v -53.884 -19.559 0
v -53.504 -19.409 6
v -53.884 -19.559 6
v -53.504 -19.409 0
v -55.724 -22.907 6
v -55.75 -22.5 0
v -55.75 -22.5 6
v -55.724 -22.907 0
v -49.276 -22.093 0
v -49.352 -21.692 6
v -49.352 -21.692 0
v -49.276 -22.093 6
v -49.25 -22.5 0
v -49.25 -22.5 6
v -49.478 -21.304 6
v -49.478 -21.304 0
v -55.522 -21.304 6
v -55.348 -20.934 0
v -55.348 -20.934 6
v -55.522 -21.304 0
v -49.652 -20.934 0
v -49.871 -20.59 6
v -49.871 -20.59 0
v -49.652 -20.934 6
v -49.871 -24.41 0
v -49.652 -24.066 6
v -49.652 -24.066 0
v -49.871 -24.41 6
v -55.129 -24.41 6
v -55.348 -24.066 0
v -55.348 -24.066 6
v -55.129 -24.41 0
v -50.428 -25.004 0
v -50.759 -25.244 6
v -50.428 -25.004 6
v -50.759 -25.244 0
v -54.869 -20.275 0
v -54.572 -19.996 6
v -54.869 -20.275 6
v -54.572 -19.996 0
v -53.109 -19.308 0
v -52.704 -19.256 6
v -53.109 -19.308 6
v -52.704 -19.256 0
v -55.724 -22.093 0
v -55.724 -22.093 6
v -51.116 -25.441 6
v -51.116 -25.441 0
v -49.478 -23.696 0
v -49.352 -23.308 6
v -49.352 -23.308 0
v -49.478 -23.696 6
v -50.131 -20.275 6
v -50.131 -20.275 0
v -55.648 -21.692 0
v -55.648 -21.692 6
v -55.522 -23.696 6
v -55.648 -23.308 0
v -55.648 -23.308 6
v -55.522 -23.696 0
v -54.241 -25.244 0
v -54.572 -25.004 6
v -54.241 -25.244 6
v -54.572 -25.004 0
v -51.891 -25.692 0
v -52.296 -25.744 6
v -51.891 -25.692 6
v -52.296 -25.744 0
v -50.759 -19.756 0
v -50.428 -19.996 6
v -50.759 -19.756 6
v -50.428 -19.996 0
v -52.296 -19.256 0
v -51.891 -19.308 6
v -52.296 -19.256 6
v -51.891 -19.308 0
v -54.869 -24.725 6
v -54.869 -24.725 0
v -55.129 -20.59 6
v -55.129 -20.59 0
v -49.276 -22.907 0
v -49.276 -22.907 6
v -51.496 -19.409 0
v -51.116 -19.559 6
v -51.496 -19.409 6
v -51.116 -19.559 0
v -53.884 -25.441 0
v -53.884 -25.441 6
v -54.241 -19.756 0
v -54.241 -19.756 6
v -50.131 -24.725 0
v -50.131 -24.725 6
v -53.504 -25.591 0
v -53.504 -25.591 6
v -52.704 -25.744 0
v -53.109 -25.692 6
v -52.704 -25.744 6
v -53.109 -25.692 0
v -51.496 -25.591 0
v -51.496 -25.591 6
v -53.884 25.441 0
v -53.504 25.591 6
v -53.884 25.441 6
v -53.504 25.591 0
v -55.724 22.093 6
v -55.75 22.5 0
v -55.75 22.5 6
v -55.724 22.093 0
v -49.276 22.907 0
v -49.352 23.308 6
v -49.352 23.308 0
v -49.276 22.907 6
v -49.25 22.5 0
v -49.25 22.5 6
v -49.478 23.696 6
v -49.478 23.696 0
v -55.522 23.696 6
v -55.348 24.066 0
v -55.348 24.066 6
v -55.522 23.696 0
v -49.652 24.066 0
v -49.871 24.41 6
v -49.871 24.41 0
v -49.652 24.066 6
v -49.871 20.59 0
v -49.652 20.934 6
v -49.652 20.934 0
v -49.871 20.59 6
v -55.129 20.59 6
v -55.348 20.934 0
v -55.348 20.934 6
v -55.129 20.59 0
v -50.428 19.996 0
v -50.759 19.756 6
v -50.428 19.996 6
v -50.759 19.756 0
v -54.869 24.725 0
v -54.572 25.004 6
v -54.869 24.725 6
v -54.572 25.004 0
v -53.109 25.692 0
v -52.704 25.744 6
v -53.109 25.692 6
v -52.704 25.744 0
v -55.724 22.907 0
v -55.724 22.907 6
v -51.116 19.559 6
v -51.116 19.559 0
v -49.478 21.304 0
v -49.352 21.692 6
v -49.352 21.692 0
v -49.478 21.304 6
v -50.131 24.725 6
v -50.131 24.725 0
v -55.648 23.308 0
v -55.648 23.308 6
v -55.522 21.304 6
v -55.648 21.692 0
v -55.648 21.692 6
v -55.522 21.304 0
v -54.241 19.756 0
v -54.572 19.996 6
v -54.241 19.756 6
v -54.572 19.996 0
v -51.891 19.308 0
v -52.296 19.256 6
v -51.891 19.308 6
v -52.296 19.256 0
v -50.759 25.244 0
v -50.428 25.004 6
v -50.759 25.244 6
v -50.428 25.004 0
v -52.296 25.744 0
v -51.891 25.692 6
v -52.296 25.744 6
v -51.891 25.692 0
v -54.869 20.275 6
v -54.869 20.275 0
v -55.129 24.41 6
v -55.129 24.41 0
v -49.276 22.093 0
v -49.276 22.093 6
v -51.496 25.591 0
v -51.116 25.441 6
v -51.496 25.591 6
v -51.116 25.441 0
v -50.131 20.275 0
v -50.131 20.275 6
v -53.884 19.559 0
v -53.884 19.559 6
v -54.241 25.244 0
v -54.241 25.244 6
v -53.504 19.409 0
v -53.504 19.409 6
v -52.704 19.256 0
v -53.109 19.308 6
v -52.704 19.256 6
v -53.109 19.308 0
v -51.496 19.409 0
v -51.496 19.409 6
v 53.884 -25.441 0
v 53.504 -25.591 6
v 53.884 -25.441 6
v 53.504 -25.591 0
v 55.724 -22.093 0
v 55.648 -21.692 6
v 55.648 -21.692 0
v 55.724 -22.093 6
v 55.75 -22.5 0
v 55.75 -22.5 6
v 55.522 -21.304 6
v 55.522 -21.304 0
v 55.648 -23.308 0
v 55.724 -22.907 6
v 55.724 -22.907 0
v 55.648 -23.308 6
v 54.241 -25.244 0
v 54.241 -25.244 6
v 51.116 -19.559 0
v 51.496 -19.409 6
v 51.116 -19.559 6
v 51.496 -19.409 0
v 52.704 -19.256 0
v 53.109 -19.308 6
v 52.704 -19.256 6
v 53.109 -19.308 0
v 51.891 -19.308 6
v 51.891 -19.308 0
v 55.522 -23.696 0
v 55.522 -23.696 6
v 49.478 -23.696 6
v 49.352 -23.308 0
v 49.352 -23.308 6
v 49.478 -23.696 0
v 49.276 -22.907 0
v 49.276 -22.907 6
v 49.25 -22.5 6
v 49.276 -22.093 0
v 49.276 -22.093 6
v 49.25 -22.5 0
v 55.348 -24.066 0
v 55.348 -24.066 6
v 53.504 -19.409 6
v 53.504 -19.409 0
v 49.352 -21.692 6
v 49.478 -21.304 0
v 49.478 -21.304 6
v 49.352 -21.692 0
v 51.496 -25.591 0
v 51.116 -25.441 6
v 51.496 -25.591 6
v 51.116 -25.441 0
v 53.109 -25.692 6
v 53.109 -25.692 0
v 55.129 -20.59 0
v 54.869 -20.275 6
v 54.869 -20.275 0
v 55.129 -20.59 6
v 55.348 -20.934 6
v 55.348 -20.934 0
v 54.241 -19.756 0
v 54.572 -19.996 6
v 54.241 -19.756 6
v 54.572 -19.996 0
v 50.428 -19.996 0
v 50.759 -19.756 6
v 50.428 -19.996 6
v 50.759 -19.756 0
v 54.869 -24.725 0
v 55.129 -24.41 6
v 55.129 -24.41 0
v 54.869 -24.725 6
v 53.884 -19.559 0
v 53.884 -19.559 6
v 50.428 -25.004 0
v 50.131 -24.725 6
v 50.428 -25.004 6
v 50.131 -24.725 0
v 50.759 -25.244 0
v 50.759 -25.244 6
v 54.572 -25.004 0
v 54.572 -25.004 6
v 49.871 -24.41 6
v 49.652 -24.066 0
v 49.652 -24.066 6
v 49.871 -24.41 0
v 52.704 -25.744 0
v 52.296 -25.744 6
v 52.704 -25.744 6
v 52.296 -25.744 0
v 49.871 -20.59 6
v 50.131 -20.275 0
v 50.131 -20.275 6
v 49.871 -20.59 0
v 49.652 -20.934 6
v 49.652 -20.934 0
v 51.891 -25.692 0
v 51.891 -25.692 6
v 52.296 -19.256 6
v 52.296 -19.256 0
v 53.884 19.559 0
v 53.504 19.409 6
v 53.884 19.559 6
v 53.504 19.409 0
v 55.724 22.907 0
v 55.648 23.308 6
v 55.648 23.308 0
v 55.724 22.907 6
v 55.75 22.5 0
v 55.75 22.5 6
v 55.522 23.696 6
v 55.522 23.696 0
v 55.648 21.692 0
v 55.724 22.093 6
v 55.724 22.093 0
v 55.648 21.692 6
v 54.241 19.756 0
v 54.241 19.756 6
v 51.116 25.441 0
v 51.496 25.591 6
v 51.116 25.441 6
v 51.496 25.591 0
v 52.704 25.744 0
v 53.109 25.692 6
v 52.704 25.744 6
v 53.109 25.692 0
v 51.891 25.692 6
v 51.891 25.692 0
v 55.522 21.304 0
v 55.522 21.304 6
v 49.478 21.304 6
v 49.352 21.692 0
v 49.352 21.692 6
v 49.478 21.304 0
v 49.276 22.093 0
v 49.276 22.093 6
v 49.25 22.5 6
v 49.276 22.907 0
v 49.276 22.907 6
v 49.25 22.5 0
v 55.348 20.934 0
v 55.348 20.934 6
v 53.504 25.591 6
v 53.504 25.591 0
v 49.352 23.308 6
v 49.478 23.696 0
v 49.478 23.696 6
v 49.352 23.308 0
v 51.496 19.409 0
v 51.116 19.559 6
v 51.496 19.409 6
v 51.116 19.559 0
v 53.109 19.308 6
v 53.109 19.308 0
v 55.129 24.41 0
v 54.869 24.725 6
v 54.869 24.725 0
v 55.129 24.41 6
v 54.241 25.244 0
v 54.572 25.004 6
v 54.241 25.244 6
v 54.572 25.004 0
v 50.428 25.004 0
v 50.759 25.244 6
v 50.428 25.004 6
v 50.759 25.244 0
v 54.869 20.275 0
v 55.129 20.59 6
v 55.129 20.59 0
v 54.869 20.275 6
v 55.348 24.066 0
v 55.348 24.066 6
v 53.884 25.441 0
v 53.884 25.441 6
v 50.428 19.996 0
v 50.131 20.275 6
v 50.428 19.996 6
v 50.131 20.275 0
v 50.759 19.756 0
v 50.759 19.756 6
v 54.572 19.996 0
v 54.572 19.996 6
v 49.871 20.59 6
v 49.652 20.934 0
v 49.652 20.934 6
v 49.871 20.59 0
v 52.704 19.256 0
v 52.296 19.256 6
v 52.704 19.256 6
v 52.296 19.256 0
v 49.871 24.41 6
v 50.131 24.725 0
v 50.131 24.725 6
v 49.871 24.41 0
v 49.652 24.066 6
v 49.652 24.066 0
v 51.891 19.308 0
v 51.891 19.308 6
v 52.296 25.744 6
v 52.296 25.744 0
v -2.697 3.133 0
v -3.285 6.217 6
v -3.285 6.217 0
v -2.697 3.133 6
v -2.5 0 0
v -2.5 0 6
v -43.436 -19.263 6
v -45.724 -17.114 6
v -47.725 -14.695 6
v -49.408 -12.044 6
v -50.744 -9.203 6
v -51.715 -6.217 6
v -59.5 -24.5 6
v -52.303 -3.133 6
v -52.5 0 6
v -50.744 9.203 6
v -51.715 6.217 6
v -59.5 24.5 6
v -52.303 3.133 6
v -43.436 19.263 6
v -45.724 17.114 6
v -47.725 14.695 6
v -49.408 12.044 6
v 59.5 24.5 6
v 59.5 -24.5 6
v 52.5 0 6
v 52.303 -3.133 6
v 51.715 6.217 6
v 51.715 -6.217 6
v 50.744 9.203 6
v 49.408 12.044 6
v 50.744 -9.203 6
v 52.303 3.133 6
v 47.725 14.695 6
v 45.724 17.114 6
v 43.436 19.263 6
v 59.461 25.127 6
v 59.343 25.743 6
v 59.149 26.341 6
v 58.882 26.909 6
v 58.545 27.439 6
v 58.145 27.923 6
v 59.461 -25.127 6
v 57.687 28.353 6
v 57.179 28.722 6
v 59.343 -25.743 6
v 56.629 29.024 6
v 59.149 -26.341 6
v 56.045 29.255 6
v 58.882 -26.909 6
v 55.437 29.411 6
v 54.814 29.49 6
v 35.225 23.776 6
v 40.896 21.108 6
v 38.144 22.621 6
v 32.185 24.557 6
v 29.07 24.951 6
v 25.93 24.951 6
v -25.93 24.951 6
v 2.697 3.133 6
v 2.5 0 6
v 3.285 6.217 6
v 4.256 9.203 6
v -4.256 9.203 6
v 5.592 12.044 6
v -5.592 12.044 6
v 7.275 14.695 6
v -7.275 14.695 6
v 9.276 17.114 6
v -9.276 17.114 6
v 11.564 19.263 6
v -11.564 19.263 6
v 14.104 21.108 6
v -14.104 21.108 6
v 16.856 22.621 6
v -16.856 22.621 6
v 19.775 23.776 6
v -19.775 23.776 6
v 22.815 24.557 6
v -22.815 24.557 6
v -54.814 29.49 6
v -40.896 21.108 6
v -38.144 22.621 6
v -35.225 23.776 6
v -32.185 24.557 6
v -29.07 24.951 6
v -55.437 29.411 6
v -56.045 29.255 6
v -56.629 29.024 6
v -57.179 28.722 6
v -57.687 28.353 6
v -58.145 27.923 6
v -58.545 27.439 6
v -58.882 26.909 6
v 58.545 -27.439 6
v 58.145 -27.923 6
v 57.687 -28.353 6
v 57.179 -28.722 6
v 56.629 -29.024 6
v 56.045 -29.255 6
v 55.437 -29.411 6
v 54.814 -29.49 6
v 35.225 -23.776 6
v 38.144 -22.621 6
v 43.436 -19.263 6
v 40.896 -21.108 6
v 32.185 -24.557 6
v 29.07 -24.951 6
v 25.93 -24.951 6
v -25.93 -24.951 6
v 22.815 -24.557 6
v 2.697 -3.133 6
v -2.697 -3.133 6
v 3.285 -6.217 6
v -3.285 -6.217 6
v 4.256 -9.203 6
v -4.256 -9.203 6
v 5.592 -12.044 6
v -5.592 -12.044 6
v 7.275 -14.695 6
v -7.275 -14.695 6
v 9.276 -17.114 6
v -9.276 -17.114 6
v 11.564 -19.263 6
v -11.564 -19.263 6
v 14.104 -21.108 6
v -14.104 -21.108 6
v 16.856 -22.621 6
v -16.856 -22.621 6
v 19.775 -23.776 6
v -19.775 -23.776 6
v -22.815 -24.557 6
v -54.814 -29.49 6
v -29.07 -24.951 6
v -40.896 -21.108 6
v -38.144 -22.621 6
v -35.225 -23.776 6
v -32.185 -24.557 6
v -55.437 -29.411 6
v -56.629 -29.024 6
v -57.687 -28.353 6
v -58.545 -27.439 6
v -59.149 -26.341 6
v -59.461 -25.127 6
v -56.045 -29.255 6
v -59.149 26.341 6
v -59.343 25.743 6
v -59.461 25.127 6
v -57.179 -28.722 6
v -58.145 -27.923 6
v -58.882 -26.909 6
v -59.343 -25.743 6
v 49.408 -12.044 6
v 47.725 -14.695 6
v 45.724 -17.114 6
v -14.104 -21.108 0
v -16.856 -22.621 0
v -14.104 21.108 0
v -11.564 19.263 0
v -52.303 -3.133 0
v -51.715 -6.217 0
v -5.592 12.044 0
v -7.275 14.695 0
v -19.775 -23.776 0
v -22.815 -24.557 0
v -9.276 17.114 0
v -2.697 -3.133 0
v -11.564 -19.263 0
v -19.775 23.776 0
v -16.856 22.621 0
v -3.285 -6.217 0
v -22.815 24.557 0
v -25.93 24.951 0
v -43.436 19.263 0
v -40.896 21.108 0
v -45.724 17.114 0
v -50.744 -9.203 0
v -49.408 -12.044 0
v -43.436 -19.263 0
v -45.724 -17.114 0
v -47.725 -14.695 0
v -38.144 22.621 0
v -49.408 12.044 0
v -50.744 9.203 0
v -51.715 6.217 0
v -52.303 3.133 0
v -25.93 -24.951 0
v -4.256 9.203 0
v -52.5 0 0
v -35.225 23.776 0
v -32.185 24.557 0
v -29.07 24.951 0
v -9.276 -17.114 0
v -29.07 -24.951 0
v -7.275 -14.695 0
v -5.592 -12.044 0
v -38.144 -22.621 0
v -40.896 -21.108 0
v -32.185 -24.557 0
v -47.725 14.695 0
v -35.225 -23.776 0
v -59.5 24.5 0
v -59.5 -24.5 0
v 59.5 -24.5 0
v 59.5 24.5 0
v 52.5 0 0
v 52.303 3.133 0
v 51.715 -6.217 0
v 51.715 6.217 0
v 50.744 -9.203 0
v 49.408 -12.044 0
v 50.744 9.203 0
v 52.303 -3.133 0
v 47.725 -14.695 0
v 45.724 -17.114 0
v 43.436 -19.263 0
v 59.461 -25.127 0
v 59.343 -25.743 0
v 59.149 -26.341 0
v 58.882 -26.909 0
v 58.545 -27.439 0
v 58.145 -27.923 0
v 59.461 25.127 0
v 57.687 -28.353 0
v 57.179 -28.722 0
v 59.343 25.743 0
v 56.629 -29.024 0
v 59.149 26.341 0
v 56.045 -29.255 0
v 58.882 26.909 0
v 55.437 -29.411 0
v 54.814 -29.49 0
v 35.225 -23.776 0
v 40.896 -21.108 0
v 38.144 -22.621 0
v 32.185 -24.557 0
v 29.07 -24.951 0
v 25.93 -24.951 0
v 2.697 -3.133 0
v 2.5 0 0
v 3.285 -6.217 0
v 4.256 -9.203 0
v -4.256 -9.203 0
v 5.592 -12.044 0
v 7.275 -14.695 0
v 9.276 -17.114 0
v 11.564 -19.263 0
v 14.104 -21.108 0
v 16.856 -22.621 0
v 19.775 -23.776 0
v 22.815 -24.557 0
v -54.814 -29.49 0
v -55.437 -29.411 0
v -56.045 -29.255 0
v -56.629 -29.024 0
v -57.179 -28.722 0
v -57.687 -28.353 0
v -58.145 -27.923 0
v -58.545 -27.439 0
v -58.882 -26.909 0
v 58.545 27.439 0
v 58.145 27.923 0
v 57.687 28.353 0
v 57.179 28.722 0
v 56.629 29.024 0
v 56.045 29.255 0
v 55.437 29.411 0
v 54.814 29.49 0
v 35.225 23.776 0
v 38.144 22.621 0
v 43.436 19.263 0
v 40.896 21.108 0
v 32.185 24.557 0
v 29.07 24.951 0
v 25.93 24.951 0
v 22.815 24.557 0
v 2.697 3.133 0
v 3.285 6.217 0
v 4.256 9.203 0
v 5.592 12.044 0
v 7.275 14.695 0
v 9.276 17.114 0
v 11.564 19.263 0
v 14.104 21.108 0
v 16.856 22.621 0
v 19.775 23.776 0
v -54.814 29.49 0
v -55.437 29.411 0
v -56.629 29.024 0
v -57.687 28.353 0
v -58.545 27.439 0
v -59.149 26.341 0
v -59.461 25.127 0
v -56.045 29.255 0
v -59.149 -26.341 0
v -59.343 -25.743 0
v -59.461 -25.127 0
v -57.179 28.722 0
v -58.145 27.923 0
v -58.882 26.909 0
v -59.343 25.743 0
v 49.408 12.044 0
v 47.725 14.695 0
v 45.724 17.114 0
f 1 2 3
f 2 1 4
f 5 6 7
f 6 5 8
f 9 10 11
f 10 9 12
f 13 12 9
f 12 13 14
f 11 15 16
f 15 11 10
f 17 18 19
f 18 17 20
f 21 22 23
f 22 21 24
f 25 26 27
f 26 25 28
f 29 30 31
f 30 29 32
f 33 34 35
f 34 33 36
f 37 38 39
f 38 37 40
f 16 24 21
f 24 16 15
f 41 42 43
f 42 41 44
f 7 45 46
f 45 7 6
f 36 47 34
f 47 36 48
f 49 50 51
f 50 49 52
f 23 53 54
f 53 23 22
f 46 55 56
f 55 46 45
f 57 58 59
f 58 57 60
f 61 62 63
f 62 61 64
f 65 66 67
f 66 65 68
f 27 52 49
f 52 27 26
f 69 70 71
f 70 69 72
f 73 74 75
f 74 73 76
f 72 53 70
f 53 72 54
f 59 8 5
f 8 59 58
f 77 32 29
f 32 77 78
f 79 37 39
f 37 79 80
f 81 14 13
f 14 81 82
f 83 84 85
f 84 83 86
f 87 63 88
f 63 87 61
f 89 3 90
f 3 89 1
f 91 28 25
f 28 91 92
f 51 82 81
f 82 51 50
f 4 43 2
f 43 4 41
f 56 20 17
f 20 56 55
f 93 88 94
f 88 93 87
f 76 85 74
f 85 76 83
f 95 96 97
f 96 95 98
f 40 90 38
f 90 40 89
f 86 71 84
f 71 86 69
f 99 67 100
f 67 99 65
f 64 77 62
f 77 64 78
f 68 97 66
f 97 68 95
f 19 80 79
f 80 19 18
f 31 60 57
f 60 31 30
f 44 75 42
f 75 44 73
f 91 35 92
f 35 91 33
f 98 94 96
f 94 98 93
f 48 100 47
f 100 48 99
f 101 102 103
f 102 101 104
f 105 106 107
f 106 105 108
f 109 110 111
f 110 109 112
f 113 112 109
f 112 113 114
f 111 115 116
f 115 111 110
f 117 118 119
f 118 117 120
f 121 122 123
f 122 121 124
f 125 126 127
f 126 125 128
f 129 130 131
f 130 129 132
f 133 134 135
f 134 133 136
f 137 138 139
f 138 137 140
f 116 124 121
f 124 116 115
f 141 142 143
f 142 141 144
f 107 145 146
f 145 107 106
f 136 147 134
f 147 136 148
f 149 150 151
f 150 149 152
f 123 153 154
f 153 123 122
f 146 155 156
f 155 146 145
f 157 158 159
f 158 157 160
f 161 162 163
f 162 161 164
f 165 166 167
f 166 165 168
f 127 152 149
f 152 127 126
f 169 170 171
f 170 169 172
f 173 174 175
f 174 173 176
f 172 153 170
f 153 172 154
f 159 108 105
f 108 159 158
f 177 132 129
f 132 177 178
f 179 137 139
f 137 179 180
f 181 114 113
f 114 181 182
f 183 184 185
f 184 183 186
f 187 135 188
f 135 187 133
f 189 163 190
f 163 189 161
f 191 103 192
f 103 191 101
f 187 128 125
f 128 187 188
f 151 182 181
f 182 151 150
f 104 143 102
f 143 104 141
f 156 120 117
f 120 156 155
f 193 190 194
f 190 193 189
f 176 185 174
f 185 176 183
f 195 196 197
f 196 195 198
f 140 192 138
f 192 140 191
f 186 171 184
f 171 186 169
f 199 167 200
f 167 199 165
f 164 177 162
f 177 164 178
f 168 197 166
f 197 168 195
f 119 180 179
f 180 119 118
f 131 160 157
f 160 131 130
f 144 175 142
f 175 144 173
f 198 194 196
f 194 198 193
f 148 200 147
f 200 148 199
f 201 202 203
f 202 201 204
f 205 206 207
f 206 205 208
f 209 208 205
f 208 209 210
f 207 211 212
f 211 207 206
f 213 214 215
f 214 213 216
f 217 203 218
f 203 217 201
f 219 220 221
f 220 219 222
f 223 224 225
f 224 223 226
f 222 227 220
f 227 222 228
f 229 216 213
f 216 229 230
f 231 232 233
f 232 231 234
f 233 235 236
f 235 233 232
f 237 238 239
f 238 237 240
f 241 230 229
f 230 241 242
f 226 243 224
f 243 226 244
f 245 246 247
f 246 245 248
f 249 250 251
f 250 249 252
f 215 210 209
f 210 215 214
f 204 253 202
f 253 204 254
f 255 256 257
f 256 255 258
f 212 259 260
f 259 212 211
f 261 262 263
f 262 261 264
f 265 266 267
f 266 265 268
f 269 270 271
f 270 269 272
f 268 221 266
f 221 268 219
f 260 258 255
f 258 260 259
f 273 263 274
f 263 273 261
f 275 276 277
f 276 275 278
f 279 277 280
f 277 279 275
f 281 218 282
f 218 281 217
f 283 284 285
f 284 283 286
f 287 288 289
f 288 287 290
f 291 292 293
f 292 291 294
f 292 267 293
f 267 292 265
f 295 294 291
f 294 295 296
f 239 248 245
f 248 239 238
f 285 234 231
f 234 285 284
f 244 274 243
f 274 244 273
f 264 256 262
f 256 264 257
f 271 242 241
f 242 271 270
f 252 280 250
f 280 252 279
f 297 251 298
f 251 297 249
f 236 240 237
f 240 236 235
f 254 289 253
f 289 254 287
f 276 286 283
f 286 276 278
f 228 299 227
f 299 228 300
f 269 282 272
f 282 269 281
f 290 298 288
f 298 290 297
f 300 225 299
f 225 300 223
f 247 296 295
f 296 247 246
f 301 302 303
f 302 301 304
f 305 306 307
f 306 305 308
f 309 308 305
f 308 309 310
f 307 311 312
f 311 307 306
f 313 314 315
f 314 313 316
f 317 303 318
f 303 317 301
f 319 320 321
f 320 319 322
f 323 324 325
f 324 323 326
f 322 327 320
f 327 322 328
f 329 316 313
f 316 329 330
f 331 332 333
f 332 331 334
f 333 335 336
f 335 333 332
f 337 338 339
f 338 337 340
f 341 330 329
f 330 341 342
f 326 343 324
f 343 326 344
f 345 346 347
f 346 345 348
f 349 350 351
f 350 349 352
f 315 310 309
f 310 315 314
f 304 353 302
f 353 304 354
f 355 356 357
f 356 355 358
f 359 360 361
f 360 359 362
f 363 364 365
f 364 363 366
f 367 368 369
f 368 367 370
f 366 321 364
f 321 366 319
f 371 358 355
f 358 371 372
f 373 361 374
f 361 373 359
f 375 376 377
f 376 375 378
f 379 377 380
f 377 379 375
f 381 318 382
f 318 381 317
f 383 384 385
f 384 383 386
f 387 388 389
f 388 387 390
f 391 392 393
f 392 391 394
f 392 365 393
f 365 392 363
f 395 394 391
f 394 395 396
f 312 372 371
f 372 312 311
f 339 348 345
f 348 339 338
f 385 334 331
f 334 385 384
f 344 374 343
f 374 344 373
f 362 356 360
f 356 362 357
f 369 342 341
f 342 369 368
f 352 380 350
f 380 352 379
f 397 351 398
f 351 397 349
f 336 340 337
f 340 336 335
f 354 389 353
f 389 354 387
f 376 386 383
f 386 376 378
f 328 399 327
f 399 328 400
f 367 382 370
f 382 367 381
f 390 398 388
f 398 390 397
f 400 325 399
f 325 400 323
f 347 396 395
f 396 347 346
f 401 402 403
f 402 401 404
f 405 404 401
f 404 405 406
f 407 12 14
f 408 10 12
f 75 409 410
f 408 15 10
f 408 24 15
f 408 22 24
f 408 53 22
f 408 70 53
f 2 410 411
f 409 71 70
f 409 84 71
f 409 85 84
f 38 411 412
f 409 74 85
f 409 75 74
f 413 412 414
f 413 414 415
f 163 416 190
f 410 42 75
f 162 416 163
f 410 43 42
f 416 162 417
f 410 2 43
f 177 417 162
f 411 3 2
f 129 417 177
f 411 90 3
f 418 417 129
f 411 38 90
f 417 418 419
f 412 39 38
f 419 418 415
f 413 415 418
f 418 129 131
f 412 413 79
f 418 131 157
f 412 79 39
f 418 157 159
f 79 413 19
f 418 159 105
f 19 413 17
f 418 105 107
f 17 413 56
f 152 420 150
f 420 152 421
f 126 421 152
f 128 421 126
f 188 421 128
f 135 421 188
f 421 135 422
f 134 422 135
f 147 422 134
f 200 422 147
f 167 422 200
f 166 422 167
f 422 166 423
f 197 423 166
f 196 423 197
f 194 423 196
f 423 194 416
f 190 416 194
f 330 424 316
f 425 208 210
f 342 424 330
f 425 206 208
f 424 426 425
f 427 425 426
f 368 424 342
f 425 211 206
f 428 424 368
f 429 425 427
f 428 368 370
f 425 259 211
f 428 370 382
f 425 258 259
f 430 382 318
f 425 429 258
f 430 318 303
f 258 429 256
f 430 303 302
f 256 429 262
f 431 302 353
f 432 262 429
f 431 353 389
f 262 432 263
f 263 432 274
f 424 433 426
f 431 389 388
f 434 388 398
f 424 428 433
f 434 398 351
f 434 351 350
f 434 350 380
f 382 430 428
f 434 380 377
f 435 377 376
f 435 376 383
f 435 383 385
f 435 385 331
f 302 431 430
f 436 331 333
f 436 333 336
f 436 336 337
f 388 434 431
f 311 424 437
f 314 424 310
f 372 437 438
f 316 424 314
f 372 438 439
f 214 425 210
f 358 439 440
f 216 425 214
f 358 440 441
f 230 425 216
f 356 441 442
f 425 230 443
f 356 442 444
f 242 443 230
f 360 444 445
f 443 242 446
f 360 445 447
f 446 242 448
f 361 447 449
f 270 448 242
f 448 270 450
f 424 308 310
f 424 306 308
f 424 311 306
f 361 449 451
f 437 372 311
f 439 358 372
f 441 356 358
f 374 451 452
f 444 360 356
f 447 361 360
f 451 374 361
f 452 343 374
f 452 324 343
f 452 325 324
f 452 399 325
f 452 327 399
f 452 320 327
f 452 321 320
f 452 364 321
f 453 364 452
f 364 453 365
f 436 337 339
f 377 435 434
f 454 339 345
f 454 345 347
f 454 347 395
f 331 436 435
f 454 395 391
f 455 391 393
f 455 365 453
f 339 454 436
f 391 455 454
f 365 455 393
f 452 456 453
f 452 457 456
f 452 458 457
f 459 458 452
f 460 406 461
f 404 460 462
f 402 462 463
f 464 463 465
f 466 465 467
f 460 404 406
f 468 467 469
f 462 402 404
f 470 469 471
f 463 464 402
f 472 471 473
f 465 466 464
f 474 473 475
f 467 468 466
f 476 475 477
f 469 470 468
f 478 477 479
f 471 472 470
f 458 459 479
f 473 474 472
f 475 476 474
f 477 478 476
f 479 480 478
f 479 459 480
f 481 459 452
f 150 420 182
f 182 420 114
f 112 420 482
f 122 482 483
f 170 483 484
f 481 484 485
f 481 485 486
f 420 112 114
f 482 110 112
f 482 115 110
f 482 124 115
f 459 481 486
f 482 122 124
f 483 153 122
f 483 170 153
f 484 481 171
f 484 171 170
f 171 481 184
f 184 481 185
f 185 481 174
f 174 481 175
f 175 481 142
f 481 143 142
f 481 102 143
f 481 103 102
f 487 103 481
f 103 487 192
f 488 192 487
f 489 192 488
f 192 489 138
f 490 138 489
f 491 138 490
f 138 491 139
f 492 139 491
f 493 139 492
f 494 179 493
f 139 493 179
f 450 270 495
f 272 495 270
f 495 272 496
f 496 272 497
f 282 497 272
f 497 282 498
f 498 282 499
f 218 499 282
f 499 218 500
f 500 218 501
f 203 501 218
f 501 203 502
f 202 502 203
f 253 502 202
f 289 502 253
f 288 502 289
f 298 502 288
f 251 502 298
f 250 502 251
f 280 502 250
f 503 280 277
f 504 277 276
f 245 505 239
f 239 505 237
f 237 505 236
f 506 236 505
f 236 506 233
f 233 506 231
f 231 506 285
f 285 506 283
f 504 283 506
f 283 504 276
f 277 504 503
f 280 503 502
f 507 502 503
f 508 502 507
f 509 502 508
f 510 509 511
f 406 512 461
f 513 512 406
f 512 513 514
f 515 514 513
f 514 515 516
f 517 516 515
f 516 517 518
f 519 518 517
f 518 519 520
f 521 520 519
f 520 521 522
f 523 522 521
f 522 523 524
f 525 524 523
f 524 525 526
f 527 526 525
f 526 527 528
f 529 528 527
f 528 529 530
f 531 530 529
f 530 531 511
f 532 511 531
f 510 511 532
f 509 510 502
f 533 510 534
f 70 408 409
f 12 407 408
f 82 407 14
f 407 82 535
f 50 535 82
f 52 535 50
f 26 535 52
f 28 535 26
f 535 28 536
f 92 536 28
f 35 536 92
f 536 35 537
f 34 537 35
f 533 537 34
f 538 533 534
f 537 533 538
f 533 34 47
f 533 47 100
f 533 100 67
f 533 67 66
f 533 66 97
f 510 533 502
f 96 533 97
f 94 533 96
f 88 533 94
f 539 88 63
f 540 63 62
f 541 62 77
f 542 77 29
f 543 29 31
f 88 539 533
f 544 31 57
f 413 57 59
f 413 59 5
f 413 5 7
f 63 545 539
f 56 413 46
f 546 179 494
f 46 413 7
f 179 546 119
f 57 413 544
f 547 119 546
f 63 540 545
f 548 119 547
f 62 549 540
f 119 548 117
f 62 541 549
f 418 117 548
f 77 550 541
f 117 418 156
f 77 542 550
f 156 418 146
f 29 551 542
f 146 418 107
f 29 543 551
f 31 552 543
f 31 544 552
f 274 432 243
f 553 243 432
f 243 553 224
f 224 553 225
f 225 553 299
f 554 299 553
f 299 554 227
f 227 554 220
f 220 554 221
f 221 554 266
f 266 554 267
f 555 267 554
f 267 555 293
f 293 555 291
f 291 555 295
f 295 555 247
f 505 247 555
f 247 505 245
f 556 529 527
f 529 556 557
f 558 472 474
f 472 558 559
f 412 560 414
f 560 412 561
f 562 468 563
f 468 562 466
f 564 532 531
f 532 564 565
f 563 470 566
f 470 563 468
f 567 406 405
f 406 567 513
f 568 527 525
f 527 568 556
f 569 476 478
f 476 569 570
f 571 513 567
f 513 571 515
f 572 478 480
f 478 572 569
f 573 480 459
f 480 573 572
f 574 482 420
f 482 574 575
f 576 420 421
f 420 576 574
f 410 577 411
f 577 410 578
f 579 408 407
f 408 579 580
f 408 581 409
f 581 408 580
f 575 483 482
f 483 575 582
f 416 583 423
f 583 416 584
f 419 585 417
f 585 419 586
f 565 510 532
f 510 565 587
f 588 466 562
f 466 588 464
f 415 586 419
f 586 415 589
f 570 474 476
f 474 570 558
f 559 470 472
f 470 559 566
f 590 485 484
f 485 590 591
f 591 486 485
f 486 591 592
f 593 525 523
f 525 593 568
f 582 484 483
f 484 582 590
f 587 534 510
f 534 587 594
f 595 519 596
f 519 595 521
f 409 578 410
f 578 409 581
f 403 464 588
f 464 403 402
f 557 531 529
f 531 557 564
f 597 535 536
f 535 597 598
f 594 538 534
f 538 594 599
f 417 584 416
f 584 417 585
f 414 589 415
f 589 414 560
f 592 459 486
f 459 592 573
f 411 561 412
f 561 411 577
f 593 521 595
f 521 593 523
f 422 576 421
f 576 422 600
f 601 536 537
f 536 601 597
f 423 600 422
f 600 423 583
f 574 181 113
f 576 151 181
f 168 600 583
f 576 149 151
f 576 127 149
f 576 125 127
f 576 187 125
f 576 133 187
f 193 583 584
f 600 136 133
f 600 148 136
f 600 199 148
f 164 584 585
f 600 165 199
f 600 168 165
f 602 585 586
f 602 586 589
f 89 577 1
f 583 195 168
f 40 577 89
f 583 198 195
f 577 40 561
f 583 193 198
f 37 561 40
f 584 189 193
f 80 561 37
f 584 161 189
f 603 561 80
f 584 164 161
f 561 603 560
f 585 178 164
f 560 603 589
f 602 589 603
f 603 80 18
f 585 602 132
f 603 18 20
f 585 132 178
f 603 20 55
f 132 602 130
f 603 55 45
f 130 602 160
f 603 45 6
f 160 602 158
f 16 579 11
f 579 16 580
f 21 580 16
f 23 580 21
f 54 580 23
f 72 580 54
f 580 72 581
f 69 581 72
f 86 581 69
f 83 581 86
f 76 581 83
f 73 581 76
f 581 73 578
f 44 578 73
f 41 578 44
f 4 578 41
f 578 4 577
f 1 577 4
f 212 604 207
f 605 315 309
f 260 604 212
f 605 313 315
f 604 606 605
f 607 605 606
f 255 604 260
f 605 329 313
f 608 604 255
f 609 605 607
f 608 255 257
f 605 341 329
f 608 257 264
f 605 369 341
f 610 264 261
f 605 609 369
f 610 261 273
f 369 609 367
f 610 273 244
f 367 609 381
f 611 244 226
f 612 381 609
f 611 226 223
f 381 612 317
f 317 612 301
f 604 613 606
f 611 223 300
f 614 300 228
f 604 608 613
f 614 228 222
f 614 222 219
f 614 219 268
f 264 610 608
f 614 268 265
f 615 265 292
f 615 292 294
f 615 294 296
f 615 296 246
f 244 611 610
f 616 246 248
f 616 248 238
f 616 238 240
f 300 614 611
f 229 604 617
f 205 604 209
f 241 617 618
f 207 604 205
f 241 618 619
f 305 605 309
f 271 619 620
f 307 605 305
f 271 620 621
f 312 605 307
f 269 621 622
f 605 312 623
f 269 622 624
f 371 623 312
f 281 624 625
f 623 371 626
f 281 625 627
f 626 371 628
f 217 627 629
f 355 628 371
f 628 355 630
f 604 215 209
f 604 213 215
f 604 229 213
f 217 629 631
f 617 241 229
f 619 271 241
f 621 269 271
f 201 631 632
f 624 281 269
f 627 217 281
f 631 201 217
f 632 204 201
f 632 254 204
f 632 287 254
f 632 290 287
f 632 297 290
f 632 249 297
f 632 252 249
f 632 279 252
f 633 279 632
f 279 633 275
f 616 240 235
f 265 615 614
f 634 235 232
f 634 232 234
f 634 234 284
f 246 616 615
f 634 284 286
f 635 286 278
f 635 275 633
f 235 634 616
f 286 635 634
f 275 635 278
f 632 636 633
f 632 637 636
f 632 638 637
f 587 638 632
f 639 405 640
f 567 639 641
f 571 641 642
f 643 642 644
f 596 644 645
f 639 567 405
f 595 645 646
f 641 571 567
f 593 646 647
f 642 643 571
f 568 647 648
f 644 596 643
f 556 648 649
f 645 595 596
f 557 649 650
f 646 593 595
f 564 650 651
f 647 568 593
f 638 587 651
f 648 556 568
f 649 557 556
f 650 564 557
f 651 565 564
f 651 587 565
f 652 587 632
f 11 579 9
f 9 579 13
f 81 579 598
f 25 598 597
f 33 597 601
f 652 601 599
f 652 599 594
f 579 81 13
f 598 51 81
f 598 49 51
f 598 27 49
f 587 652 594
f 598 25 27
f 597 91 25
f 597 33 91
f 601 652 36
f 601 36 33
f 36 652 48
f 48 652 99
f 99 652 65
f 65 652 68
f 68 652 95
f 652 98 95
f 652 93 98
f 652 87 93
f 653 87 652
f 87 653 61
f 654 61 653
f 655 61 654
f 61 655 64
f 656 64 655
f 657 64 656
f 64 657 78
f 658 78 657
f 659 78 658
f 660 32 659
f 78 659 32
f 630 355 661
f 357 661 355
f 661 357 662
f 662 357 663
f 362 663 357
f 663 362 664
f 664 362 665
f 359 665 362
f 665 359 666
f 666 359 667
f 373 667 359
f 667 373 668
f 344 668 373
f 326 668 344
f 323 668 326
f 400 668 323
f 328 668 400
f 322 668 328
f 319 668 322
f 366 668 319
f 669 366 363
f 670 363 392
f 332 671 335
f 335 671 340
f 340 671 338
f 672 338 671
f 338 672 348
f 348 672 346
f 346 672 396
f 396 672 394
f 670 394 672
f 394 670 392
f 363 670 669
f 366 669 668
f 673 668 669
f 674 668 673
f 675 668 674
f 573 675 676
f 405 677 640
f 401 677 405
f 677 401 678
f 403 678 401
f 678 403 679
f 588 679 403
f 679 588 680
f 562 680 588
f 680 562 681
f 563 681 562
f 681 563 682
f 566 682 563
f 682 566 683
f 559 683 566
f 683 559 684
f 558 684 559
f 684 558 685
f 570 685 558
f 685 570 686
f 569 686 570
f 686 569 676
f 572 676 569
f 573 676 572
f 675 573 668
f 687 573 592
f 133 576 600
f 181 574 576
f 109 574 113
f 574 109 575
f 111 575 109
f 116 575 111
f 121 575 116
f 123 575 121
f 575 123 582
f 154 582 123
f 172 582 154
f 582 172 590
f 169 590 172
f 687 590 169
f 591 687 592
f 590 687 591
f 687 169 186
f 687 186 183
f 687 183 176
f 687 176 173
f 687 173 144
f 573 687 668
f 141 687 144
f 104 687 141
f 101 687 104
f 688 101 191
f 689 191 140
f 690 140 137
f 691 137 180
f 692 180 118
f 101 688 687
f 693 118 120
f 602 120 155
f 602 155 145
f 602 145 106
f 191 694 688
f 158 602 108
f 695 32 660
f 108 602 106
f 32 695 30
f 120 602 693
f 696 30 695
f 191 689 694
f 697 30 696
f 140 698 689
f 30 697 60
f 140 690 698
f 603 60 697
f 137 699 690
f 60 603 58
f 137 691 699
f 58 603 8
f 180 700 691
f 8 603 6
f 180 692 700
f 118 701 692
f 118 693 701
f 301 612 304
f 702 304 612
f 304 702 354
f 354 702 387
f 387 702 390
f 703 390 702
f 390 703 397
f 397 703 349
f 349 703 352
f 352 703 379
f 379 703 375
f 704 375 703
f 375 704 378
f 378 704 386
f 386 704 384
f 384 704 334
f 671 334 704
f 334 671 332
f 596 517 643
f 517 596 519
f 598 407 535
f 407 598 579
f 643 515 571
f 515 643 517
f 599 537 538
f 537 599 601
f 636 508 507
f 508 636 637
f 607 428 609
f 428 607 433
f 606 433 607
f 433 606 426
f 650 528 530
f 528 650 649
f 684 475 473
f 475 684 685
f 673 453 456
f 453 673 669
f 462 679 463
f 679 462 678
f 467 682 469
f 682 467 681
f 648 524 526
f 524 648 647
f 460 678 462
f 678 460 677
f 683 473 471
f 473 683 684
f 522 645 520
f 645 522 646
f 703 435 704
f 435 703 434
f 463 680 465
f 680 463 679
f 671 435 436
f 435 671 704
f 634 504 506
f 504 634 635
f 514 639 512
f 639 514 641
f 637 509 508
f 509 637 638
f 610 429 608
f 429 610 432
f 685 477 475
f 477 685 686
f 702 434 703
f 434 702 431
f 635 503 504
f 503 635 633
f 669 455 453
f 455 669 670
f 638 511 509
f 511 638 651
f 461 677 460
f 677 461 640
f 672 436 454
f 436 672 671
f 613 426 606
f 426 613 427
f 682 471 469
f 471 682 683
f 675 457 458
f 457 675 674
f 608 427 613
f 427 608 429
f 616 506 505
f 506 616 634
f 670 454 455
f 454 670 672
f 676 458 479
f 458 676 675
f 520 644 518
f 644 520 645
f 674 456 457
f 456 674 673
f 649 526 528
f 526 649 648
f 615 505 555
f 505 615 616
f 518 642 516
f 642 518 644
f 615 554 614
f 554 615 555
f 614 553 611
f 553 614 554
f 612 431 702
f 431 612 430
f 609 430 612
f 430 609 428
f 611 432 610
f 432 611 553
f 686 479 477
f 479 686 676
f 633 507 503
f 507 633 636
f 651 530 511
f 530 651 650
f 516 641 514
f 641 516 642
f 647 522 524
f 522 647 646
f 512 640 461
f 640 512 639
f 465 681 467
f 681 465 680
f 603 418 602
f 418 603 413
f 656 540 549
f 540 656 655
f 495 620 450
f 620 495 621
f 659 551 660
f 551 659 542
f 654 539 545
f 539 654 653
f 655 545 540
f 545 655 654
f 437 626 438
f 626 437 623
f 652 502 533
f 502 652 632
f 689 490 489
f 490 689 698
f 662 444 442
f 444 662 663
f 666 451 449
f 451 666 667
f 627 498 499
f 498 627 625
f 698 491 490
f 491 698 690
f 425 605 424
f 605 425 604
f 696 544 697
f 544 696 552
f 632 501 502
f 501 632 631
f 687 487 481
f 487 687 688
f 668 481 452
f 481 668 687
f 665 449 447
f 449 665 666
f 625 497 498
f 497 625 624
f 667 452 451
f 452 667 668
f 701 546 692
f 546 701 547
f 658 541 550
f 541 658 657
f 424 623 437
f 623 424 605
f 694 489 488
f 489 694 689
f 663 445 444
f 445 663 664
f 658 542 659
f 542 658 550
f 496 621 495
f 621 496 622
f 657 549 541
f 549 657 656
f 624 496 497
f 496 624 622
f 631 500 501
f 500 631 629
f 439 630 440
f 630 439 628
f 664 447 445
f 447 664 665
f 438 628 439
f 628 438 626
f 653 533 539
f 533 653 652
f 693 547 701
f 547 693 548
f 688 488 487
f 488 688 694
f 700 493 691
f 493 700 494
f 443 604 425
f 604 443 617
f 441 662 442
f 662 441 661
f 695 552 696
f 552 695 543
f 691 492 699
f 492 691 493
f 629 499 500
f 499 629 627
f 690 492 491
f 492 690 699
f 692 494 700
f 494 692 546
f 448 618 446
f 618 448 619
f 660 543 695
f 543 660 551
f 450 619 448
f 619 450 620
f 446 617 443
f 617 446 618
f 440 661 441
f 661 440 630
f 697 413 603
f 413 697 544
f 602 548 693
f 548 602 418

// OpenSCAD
$fn = 50;

difference() {
	union() {
		hull() {
			translate(v = [-54.5, 24.5, 0]) {
				cylinder(h = 6, r = 5);
			}
			translate(v = [54.5, 24.5, 0]) {
				cylinder(h = 6, r = 5);
			}
			translate(v = [-54.5, -24.5, 0]) {
				cylinder(h = 6, r = 5);
			}
			translate(v = [54.5, -24.5, 0]) {
				cylinder(h = 6, r = 5);
			}
		}
	}
	union() {
		translate(v = [-52.5, -22.5, -100.0]) {
			cylinder(h = 200, r = 3.25);
		}
		translate(v = [-52.5, 22.5, -100.0]) {
			cylinder(h = 200, r = 3.25);
		}
		translate(v = [52.5, -22.5, -100.0]) {
			cylinder(h = 200, r = 3.25);
		}
		translate(v = [52.5, 22.5, -100.0]) {
			cylinder(h = 200, r = 3.25);
		}
		translate(v = [-52.5, -22.5, -100.0]) {
			cylinder(h = 200, r = 1.8);
		}
		translate(v = [-52.5, 22.5, -100.0]) {
			cylinder(h = 200, r = 1.8);
		}
		translate(v = [52.5, -22.5, -100.0]) {
			cylinder(h = 200, r = 1.8);
		}
		translate(v = [52.5, 22.5, -100.0]) {
			cylinder(h = 200, r = 1.8);
		}
		translate(v = [-27.5, 0, 0.0]) {
			cylinder(h = 6, r = 25.0);
		}
		translate(v = [27.5, 0, 0.0]) {
			cylinder(h = 6, r = 25.0);
		}
	}
}
